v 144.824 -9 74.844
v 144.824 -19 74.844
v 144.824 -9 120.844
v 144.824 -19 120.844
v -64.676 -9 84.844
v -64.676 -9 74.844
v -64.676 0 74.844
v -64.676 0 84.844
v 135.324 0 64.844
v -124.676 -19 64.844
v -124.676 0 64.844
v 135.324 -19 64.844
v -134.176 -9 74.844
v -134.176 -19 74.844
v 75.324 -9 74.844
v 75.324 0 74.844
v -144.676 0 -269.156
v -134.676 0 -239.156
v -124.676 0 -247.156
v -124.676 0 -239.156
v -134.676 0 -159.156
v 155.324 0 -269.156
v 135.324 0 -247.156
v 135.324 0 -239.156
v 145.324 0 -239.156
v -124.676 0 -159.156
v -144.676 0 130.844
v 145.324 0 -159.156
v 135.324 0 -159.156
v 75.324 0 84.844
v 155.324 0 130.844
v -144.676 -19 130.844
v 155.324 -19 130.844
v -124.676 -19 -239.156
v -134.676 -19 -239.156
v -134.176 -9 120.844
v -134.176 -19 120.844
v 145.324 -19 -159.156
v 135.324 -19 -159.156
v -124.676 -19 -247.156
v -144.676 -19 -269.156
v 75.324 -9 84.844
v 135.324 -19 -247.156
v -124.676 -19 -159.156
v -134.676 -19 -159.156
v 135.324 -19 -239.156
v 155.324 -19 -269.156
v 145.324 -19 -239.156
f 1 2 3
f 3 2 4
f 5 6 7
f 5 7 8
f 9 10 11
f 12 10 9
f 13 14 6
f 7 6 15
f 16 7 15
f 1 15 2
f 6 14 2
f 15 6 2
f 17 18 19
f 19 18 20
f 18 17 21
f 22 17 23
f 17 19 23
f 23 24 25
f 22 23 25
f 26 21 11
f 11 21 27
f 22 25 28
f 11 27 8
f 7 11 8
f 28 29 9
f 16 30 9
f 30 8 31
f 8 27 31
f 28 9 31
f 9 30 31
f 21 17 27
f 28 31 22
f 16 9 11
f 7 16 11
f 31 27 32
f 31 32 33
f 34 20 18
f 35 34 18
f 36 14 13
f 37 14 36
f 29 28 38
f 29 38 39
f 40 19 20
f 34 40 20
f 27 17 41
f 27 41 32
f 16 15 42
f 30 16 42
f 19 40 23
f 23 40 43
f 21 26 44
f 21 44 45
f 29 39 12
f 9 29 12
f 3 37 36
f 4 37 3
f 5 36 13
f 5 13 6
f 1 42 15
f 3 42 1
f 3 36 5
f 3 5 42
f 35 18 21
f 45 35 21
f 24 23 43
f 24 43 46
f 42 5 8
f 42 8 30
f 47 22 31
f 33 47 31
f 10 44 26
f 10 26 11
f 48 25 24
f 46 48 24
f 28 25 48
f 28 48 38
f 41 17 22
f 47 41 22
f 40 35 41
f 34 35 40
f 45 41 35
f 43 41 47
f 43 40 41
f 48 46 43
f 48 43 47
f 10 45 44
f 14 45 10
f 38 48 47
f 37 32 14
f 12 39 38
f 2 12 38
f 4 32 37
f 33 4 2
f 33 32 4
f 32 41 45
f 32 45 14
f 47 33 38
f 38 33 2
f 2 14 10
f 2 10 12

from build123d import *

# Parameters (mm, degrees)
F0_W      = 300
F0_H      = 400
F1_DEPTH  = 19
F2_W      = 279
F2_H      = 46
F3_DEPTH  = 10
F4_W      = 140
F4_H      = 10
F5_DEPTH  = 10
F6_W      = 260
F6_H      = 312
F7_DEPTH  = 19
F8_W      = 10
F8_H      = 80
F9_DEPTH  = 19
F10_W     = 10
F10_H     = 80
F11_DEPTH = 19


with BuildPart() as f1:
    # F0 (on Front) → F1 (new body)
    with BuildSketch(Plane.XZ):
        with Locations((5.324256, -69.15618)):
            Rectangle(F0_W, F0_H)
    extrude(amount=F1_DEPTH)

    # F2 (on face) → F3 (cut)
    with BuildSketch(Plane.XZ.offset(19)):
        with Locations((5.324256, 97.84382)):
            Rectangle(F2_W, F2_H)
    extrude(amount=-F3_DEPTH, mode=Mode.SUBTRACT)

    # F4 (on face) → F5 (cut)
    with BuildSketch(Plane.XZ.offset(9)):
        with Locations((5.324256, 79.84382)):
            Rectangle(F4_W, F4_H)
    extrude(amount=-F5_DEPTH, mode=Mode.SUBTRACT)

    # F6 (on face) → F7 (cut)
    with BuildSketch(Plane.XZ.offset(19)):
        with Locations((5.324256, -91.15618)):
            Rectangle(F6_W, F6_H)
    extrude(amount=-F7_DEPTH, mode=Mode.SUBTRACT)

    # F8 (on face) → F9 (cut)
    with BuildSketch(Plane(origin=(0, 0, 0), x_dir=(-1, 0, 0), z_dir=(0, 1, 0))):
        with Locations((-140.324256, -199.15618)):
            Rectangle(F8_W, F8_H)
    extrude(amount=-F9_DEPTH, mode=Mode.SUBTRACT)

    # F10 (on face) → F11 (cut)
    with BuildSketch(Plane(origin=(0, 0, 0), x_dir=(-1, 0, 0), z_dir=(0, 1, 0))):
        with Locations((129.675744, -199.15618)):
            Rectangle(F10_W, F10_H)
    extrude(amount=-F11_DEPTH, mode=Mode.SUBTRACT)


solid = f1.part
